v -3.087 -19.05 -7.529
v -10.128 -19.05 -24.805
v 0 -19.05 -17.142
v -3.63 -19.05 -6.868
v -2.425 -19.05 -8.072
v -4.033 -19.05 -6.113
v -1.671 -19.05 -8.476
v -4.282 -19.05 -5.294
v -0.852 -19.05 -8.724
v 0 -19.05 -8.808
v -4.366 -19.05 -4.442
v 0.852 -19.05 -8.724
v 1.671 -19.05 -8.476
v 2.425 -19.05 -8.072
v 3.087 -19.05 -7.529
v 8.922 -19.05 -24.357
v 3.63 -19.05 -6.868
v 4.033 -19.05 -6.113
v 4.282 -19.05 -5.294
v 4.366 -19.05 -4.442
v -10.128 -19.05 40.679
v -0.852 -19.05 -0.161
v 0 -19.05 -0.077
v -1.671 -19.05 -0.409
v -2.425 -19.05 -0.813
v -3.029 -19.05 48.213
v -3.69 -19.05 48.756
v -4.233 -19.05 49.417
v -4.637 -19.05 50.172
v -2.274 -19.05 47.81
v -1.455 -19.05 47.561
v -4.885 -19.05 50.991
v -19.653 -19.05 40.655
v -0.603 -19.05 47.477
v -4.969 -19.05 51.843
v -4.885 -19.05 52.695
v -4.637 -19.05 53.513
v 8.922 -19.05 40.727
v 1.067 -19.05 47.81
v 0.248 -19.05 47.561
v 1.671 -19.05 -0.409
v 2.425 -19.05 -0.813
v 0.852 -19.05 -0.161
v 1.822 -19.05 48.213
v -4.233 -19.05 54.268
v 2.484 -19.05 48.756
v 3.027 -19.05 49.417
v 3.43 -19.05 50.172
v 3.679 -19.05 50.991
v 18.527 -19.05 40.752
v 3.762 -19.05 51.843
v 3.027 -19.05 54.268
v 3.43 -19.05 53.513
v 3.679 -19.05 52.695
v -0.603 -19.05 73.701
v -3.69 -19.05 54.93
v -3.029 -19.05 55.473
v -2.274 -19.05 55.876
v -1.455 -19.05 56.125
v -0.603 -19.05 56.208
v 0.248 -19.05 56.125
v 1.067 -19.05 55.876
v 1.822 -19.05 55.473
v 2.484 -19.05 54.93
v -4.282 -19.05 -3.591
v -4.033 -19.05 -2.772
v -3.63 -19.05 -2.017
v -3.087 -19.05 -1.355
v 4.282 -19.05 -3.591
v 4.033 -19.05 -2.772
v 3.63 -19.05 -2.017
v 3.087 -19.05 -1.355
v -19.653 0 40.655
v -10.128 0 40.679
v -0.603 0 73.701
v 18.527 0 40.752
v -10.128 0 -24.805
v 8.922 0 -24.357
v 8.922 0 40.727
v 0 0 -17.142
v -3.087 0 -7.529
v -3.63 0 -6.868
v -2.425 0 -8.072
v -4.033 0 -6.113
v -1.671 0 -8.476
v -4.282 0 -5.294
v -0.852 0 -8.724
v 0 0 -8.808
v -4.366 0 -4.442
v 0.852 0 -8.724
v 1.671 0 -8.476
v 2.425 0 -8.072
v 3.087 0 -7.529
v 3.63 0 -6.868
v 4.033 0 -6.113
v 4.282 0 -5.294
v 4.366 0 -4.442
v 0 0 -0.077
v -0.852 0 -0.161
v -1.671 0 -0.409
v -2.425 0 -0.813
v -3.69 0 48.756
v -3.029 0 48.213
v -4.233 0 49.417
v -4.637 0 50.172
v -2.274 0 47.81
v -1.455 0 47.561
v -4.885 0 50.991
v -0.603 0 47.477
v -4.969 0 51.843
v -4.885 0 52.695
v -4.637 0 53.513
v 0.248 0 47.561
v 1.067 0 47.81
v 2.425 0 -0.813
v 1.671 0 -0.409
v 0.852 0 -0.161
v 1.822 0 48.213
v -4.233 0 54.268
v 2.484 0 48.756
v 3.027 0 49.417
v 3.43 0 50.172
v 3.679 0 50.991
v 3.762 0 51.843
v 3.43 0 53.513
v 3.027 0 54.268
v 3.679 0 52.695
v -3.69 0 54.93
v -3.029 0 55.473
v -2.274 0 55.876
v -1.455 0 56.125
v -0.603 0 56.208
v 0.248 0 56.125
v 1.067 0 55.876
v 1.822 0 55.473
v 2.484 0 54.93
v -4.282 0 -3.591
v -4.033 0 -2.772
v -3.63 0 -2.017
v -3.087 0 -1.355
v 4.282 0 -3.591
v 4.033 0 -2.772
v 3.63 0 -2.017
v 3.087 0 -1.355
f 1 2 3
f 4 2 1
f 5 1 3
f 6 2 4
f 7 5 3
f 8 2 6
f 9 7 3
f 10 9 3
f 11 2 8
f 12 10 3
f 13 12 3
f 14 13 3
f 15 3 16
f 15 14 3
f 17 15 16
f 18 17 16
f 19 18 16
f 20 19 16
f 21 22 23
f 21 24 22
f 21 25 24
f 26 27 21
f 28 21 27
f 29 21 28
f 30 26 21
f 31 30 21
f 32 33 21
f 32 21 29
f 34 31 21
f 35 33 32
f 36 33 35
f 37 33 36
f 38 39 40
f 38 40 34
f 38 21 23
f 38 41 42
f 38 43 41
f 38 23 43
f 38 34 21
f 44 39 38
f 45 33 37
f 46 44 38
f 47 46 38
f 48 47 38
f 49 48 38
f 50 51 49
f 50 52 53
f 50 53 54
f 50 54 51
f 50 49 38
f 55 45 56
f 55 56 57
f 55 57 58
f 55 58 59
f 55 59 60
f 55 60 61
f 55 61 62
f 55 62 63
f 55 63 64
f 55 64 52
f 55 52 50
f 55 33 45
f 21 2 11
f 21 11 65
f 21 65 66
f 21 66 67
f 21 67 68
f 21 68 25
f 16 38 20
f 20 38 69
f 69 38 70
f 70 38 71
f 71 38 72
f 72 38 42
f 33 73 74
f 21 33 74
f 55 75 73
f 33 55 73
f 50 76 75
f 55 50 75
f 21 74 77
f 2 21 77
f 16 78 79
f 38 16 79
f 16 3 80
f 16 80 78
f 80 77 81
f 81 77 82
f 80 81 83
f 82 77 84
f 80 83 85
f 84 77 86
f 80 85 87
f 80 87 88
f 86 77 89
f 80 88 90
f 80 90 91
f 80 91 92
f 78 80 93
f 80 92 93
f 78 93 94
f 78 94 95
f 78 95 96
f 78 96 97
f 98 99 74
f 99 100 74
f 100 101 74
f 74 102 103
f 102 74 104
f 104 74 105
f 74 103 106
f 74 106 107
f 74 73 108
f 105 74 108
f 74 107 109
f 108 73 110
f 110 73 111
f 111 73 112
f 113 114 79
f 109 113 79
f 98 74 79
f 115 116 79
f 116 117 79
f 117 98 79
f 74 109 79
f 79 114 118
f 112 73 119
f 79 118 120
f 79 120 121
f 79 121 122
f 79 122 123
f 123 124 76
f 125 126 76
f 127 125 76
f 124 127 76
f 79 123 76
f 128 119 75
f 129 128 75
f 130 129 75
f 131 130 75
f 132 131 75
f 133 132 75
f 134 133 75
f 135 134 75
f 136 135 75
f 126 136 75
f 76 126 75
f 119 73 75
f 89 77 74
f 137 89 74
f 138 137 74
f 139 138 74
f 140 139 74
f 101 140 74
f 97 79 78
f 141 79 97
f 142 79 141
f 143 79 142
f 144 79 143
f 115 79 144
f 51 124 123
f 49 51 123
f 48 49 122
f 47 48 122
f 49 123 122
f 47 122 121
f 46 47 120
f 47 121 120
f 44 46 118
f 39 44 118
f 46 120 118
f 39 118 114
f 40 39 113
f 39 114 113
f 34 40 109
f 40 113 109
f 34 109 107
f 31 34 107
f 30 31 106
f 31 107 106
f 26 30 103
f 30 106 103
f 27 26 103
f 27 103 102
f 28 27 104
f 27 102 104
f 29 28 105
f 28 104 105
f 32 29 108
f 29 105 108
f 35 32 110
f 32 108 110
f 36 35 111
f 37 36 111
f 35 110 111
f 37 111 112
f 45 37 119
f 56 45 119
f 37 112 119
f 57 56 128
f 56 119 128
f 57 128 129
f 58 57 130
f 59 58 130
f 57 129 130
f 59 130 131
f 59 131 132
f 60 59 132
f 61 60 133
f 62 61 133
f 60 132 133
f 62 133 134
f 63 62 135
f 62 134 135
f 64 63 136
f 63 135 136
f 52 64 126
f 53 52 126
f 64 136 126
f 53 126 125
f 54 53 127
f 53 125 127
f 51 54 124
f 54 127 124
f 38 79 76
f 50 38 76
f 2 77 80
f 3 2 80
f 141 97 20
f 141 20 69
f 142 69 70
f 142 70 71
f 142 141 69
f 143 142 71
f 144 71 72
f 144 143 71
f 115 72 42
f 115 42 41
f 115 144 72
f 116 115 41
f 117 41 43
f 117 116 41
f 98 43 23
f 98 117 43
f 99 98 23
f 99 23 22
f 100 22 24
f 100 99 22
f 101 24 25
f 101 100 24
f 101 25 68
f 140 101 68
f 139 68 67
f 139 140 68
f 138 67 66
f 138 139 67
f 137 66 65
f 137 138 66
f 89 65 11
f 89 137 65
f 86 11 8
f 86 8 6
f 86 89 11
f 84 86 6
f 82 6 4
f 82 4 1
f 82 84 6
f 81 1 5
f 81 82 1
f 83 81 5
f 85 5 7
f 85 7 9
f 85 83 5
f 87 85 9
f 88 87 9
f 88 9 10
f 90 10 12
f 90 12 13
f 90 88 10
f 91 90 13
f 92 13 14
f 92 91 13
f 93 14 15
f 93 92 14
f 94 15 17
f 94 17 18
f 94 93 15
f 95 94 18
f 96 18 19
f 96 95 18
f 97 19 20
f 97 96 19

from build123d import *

# Parameters (mm, degrees)
F0_R     = 4.365625
F1_DEPTH = 19.05


with BuildPart() as f1:
    # F0 (on Front) → F1 (new body)
    with BuildSketch(Plane.XZ):
        with BuildLine():
            ThreePointArc((-4.968861, 51.842821), (-0.603236, 56.208446), (3.762389, 51.842821))
            Line((3.762389, 51.842821), (8.921764, 51.842821))
            Line((8.921764, 51.842821), (8.921764, 40.727447))
            Line((8.921764, 40.727447), (18.526586, 40.751948))
            Line((18.526586, 40.751948), (-0.603236, 73.701302))
            Line((-0.603236, 73.701302), (-19.653236, 40.654553))
            Line((-19.653236, 40.654553), (-10.128236, 40.678851))
            Line((-10.128236, 40.678851), (-10.128236, 51.842821))
            Line((-10.128236, 51.842821), (-4.968861, 51.842821))
        make_face()
        Polygon((8.921764, -24.357179), (8.921764, 40.727447), (-10.128236, 40.678851), (-10.128236, -24.804613), (0, -17.142445), align=None)
        with Locations((0, -4.442445)):
            Circle(F0_R, mode=Mode.SUBTRACT)
        with BuildLine():
            Line((8.921764, 51.842821), (3.762389, 51.842821))
            ThreePointArc((3.762389, 51.842821), (-0.603236, 47.477196), (-4.968861, 51.842821))
            Line((-4.968861, 51.842821), (-10.128236, 51.842821))
            Line((-10.128236, 51.842821), (-10.128236, 40.678851))
            Line((-10.128236, 40.678851), (8.921764, 40.727447))
            Line((8.921764, 40.727447), (8.921764, 51.842821))
        make_face()
    extrude(amount=F1_DEPTH)


solid = f1.part
